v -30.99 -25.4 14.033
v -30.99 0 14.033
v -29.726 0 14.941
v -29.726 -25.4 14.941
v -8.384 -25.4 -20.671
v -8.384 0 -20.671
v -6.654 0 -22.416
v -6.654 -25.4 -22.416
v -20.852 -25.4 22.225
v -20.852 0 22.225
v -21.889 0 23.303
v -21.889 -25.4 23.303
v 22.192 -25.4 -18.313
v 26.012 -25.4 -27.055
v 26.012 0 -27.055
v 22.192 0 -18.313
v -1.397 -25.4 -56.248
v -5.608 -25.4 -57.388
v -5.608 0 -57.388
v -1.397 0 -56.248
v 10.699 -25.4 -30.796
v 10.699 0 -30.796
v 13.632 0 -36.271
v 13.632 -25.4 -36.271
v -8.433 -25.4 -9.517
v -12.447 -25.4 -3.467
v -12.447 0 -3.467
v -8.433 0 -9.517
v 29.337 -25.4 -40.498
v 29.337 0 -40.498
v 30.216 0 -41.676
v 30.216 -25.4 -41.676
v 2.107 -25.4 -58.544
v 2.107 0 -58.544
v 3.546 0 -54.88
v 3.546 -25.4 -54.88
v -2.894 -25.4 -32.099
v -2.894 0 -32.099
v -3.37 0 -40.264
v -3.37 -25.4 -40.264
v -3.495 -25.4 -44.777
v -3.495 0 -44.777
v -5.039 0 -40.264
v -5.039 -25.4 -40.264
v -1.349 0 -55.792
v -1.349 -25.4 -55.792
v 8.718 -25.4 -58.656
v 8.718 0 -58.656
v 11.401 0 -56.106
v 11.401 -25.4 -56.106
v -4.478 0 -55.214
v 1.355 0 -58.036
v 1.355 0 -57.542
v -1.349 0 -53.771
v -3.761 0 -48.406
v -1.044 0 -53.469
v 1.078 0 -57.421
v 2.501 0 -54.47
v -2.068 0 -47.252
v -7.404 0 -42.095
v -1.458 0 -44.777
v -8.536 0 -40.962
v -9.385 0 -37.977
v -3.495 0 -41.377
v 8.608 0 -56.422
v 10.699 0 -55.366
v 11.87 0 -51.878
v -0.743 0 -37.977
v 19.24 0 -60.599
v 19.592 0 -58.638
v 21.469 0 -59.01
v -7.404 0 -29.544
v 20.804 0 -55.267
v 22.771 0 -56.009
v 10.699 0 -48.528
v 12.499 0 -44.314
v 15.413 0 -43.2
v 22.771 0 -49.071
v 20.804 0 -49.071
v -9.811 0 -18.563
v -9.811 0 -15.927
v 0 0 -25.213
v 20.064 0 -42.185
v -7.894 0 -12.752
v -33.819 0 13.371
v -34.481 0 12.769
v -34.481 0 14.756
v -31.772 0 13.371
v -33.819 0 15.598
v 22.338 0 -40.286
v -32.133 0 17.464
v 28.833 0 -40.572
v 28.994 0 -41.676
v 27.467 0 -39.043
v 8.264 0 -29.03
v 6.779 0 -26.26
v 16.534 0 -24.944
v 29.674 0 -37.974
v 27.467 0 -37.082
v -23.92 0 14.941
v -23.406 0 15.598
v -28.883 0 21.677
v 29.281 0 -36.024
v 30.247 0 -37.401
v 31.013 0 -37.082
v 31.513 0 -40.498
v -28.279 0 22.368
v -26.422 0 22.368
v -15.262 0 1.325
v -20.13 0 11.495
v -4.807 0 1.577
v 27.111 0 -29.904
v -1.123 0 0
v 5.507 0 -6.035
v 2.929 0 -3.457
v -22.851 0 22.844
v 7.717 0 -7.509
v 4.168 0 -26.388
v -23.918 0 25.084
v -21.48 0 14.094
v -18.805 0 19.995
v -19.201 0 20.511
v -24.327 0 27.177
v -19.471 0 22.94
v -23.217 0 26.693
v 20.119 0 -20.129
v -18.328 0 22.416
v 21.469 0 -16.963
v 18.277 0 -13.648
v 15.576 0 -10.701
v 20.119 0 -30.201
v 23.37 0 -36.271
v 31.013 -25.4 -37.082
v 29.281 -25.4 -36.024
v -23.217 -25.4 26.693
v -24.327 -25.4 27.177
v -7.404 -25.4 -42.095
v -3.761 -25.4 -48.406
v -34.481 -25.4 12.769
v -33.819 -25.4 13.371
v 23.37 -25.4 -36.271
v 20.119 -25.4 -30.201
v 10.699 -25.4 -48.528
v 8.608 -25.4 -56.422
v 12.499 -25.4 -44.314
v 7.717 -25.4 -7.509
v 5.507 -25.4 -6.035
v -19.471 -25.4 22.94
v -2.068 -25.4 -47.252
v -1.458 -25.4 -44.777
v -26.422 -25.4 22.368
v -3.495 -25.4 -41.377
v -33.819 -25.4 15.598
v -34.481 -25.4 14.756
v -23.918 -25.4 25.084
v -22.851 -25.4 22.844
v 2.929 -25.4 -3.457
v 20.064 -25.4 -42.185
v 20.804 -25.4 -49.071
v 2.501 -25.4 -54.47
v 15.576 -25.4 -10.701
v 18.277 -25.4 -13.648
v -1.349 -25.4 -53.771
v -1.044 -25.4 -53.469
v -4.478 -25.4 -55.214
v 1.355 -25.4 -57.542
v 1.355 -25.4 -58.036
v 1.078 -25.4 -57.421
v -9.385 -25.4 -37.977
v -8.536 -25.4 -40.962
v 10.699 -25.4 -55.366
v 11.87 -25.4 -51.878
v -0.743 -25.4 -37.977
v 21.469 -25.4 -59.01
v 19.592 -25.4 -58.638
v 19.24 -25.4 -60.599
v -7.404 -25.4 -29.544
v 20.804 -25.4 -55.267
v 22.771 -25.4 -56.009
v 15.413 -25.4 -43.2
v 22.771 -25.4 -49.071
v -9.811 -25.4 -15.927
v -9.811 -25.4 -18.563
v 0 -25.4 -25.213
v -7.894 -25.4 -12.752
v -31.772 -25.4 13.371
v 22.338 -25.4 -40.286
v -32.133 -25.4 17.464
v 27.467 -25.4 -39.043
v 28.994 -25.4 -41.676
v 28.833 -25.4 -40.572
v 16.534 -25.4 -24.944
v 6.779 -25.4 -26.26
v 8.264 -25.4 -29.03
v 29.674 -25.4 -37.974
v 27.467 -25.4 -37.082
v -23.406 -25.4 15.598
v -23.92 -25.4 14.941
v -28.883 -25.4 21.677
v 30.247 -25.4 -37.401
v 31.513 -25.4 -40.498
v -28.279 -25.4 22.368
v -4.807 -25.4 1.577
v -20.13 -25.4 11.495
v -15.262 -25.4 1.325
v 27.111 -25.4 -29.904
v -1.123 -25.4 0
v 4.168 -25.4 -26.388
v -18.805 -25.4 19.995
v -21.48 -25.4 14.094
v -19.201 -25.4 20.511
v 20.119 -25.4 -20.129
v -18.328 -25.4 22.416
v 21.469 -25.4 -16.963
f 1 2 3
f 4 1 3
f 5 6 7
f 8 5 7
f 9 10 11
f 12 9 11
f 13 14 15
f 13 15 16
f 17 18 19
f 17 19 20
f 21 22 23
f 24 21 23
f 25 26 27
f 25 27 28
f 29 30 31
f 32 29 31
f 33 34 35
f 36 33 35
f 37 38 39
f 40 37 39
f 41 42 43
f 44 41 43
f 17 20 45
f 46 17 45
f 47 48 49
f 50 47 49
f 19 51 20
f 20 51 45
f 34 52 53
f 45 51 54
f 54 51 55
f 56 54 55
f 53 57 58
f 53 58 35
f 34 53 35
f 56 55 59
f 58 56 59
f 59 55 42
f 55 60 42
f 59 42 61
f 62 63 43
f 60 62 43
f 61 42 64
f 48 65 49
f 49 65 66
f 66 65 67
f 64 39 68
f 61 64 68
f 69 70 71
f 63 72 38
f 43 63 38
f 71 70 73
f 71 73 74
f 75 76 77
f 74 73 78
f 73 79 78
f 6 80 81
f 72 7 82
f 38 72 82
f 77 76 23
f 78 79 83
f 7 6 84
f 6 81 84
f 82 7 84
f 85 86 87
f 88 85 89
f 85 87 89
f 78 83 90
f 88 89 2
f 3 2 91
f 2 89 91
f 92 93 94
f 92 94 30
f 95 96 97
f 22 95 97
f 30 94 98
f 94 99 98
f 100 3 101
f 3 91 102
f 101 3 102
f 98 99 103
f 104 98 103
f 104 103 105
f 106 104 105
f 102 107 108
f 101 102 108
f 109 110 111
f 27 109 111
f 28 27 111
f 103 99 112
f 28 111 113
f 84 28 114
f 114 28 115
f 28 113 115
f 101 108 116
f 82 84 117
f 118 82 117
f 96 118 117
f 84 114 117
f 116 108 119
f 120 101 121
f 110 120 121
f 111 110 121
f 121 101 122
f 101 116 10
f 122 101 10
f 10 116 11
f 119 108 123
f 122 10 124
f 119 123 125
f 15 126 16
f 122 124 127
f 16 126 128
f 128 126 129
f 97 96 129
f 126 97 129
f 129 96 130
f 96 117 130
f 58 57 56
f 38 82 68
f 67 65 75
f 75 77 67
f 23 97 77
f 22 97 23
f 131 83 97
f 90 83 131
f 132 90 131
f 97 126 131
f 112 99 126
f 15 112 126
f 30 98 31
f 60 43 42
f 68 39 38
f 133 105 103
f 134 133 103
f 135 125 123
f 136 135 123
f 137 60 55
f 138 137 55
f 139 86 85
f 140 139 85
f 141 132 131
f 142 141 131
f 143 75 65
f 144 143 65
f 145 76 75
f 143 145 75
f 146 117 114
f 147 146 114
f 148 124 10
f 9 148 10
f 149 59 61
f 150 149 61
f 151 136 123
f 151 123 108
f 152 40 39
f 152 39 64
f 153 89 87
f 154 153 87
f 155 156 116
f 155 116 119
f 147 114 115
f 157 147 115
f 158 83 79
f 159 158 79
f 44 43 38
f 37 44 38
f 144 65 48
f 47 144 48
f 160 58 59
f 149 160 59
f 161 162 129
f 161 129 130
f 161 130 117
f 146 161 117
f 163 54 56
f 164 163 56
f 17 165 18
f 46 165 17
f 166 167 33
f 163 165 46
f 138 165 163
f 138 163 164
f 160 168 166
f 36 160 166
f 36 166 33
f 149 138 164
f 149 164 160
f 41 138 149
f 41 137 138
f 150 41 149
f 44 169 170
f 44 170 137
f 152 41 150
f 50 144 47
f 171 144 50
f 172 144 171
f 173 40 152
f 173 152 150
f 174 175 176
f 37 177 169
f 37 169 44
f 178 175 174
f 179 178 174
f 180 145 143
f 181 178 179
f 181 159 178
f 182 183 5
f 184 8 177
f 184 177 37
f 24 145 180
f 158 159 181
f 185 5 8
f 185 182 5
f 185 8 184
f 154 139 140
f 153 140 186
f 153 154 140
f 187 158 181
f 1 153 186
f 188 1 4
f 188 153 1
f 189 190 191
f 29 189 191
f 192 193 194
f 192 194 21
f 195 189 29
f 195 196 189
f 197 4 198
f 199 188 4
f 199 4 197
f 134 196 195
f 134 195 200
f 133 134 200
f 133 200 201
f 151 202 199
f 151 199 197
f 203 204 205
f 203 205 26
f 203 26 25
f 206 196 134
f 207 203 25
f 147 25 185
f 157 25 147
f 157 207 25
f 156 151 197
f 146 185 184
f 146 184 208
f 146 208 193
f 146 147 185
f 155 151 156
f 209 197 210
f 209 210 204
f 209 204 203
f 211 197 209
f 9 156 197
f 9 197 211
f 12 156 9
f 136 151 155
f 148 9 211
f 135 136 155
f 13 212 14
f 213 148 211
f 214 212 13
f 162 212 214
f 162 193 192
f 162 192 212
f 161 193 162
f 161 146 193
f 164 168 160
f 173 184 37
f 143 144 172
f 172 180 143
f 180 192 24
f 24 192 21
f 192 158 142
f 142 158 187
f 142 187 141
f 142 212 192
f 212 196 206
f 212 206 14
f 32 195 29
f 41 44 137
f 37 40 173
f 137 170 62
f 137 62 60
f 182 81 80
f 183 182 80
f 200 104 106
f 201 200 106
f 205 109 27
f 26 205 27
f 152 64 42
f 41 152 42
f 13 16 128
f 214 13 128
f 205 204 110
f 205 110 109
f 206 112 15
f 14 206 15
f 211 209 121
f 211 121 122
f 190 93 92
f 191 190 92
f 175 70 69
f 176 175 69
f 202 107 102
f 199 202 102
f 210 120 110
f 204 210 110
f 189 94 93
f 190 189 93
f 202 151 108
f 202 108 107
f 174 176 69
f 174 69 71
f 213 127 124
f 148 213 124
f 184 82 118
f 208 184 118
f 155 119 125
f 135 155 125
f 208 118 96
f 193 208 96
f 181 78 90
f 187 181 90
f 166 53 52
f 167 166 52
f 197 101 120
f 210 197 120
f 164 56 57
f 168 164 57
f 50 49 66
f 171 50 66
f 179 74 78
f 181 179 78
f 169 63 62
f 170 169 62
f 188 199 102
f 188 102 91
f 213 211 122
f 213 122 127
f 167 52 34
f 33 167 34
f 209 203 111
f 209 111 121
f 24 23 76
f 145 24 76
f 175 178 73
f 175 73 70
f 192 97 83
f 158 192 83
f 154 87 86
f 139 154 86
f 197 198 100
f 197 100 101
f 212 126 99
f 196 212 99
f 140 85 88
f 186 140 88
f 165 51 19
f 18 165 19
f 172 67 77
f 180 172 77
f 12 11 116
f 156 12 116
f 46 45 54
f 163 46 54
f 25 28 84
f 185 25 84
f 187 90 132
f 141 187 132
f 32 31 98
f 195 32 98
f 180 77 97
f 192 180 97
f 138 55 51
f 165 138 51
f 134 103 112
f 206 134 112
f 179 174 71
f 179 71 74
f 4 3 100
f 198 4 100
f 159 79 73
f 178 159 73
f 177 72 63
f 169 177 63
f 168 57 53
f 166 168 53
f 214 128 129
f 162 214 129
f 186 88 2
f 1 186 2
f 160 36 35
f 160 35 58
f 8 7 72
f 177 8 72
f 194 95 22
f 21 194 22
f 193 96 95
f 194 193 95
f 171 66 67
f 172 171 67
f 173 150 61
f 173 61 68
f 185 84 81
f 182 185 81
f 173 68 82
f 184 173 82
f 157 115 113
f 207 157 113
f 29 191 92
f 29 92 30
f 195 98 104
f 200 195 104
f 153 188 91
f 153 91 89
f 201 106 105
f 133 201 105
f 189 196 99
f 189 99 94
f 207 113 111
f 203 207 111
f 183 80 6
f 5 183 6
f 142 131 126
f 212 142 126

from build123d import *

# Parameters (mm, degrees)
F1_DEPTH = 25.4


with BuildPart() as f1:
    # F0 (on Front) → F1 (new body)
    with BuildSketch(Plane.XZ):
        Polygon((-4.807071, 1.577358), (-18.804783, 19.995399), (-19.201438, 20.510813), (-18.328309, 22.415822), (-19.470988, 22.93955), (-20.851724, 22.225376), (-21.888541, 23.302863), (-22.851409, 22.844328), (-23.918144, 25.084342), (-23.217195, 26.69334), (-24.327368, 27.17698), (-26.422277, 22.368211), (-28.279129, 22.368211), (-28.883137, 21.677395), (-32.133359, 17.464144), (-33.818658, 15.598277), (-34.480739, 14.755626), (-34.480739, 12.769381), (-33.818658, 13.371274), (-31.772222, 13.371274), (-30.989761, 14.033356), (-29.725786, 14.940684), (-26.475566, 14.940684), (-23.919655, 14.940684), (-23.405911, 15.598277), (-21.479854, 14.093545), (-20.130018, 11.494951), (-15.262124, 1.325255), (-12.446605, -3.467118), (-8.432992, -9.51749), (-7.893849, -12.752342), (-9.810799, -15.927291), (-9.810799, -18.563095), (-8.383603, -20.670711), (-6.653502, -22.416285), (0, -25.213145), (4.167965, -26.388429), (6.779463, -26.259693), (8.263807, -29.03047), (10.698803, -30.795518), (13.631921, -36.270678), (12.499449, -44.314019), (10.698803, -48.52825), (8.607689, -56.42225), (8.717785, -58.655619), (11.401466, -56.10612), (10.698803, -55.366475), (11.870418, -51.878039), (15.41289, -43.200385), (16.533865, -24.944445), (20.064365, -42.185199), (20.804008, -49.071185), (20.804008, -52.51319), (20.804008, -55.267211), (19.592239, -58.638137), (19.239724, -60.599003), (21.46933, -59.010107), (22.771196, -56.008819), (22.771196, -49.071185), (22.338118, -40.285911), (23.370066, -36.270678), (20.118674, -30.201407), (20.118674, -27.645931), (20.118674, -20.128688), (27.467125, -37.082013), (27.467125, -39.04331), (28.99437, -41.676154), (28.832508, -40.571583), (29.336633, -40.497709), (30.216336, -41.676154), (29.67385, -37.97416), (30.246906, -37.401102), (31.513076, -40.497709), (31.012544, -37.082013), (29.280987, -36.023837), (27.111409, -29.904326), (26.01208, -27.055074), (22.192179, -18.312787), (21.46933, -16.963469), (18.276872, -13.64822), (15.57556, -10.701334), (7.717195, -7.508874), (5.507031, -6.035431), (2.928506, -3.456905), (-1.123464, 0), align=None)
        Polygon((0, -25.213145), (-6.653502, -22.416285), (-7.403816, -29.544273), (-9.385442, -37.977327), (-8.536174, -40.962219), (-7.403816, -42.094577), (-3.761253, -48.406478), (-1.043809, -53.469059), (1.077536, -57.421111), (1.354785, -57.54178), (1.354785, -58.036473), (2.10664, -58.543845), (3.545563, -54.87987), (2.500879, -54.4696), (-2.067813, -47.252391), (-3.49469, -44.776939), (-5.039291, -40.263818), (-2.894435, -32.09877), align=None)
        Polygon((-0.742696, -37.977327), (0, -25.213145), (-2.894435, -32.09877), (-3.369526, -40.263818), (-3.49469, -41.377133), (-3.49469, -44.776939), (-2.067813, -47.252391), (-1.458444, -44.776939), align=None)
        Polygon((-1.043809, -53.469059), (-3.761253, -48.406478), (-4.477841, -55.21406), (-5.608209, -57.388235), (-1.396718, -56.248265), (-1.348698, -55.792075), (-1.348698, -53.771246), align=None)
    extrude(amount=F1_DEPTH)


solid = f1.part
